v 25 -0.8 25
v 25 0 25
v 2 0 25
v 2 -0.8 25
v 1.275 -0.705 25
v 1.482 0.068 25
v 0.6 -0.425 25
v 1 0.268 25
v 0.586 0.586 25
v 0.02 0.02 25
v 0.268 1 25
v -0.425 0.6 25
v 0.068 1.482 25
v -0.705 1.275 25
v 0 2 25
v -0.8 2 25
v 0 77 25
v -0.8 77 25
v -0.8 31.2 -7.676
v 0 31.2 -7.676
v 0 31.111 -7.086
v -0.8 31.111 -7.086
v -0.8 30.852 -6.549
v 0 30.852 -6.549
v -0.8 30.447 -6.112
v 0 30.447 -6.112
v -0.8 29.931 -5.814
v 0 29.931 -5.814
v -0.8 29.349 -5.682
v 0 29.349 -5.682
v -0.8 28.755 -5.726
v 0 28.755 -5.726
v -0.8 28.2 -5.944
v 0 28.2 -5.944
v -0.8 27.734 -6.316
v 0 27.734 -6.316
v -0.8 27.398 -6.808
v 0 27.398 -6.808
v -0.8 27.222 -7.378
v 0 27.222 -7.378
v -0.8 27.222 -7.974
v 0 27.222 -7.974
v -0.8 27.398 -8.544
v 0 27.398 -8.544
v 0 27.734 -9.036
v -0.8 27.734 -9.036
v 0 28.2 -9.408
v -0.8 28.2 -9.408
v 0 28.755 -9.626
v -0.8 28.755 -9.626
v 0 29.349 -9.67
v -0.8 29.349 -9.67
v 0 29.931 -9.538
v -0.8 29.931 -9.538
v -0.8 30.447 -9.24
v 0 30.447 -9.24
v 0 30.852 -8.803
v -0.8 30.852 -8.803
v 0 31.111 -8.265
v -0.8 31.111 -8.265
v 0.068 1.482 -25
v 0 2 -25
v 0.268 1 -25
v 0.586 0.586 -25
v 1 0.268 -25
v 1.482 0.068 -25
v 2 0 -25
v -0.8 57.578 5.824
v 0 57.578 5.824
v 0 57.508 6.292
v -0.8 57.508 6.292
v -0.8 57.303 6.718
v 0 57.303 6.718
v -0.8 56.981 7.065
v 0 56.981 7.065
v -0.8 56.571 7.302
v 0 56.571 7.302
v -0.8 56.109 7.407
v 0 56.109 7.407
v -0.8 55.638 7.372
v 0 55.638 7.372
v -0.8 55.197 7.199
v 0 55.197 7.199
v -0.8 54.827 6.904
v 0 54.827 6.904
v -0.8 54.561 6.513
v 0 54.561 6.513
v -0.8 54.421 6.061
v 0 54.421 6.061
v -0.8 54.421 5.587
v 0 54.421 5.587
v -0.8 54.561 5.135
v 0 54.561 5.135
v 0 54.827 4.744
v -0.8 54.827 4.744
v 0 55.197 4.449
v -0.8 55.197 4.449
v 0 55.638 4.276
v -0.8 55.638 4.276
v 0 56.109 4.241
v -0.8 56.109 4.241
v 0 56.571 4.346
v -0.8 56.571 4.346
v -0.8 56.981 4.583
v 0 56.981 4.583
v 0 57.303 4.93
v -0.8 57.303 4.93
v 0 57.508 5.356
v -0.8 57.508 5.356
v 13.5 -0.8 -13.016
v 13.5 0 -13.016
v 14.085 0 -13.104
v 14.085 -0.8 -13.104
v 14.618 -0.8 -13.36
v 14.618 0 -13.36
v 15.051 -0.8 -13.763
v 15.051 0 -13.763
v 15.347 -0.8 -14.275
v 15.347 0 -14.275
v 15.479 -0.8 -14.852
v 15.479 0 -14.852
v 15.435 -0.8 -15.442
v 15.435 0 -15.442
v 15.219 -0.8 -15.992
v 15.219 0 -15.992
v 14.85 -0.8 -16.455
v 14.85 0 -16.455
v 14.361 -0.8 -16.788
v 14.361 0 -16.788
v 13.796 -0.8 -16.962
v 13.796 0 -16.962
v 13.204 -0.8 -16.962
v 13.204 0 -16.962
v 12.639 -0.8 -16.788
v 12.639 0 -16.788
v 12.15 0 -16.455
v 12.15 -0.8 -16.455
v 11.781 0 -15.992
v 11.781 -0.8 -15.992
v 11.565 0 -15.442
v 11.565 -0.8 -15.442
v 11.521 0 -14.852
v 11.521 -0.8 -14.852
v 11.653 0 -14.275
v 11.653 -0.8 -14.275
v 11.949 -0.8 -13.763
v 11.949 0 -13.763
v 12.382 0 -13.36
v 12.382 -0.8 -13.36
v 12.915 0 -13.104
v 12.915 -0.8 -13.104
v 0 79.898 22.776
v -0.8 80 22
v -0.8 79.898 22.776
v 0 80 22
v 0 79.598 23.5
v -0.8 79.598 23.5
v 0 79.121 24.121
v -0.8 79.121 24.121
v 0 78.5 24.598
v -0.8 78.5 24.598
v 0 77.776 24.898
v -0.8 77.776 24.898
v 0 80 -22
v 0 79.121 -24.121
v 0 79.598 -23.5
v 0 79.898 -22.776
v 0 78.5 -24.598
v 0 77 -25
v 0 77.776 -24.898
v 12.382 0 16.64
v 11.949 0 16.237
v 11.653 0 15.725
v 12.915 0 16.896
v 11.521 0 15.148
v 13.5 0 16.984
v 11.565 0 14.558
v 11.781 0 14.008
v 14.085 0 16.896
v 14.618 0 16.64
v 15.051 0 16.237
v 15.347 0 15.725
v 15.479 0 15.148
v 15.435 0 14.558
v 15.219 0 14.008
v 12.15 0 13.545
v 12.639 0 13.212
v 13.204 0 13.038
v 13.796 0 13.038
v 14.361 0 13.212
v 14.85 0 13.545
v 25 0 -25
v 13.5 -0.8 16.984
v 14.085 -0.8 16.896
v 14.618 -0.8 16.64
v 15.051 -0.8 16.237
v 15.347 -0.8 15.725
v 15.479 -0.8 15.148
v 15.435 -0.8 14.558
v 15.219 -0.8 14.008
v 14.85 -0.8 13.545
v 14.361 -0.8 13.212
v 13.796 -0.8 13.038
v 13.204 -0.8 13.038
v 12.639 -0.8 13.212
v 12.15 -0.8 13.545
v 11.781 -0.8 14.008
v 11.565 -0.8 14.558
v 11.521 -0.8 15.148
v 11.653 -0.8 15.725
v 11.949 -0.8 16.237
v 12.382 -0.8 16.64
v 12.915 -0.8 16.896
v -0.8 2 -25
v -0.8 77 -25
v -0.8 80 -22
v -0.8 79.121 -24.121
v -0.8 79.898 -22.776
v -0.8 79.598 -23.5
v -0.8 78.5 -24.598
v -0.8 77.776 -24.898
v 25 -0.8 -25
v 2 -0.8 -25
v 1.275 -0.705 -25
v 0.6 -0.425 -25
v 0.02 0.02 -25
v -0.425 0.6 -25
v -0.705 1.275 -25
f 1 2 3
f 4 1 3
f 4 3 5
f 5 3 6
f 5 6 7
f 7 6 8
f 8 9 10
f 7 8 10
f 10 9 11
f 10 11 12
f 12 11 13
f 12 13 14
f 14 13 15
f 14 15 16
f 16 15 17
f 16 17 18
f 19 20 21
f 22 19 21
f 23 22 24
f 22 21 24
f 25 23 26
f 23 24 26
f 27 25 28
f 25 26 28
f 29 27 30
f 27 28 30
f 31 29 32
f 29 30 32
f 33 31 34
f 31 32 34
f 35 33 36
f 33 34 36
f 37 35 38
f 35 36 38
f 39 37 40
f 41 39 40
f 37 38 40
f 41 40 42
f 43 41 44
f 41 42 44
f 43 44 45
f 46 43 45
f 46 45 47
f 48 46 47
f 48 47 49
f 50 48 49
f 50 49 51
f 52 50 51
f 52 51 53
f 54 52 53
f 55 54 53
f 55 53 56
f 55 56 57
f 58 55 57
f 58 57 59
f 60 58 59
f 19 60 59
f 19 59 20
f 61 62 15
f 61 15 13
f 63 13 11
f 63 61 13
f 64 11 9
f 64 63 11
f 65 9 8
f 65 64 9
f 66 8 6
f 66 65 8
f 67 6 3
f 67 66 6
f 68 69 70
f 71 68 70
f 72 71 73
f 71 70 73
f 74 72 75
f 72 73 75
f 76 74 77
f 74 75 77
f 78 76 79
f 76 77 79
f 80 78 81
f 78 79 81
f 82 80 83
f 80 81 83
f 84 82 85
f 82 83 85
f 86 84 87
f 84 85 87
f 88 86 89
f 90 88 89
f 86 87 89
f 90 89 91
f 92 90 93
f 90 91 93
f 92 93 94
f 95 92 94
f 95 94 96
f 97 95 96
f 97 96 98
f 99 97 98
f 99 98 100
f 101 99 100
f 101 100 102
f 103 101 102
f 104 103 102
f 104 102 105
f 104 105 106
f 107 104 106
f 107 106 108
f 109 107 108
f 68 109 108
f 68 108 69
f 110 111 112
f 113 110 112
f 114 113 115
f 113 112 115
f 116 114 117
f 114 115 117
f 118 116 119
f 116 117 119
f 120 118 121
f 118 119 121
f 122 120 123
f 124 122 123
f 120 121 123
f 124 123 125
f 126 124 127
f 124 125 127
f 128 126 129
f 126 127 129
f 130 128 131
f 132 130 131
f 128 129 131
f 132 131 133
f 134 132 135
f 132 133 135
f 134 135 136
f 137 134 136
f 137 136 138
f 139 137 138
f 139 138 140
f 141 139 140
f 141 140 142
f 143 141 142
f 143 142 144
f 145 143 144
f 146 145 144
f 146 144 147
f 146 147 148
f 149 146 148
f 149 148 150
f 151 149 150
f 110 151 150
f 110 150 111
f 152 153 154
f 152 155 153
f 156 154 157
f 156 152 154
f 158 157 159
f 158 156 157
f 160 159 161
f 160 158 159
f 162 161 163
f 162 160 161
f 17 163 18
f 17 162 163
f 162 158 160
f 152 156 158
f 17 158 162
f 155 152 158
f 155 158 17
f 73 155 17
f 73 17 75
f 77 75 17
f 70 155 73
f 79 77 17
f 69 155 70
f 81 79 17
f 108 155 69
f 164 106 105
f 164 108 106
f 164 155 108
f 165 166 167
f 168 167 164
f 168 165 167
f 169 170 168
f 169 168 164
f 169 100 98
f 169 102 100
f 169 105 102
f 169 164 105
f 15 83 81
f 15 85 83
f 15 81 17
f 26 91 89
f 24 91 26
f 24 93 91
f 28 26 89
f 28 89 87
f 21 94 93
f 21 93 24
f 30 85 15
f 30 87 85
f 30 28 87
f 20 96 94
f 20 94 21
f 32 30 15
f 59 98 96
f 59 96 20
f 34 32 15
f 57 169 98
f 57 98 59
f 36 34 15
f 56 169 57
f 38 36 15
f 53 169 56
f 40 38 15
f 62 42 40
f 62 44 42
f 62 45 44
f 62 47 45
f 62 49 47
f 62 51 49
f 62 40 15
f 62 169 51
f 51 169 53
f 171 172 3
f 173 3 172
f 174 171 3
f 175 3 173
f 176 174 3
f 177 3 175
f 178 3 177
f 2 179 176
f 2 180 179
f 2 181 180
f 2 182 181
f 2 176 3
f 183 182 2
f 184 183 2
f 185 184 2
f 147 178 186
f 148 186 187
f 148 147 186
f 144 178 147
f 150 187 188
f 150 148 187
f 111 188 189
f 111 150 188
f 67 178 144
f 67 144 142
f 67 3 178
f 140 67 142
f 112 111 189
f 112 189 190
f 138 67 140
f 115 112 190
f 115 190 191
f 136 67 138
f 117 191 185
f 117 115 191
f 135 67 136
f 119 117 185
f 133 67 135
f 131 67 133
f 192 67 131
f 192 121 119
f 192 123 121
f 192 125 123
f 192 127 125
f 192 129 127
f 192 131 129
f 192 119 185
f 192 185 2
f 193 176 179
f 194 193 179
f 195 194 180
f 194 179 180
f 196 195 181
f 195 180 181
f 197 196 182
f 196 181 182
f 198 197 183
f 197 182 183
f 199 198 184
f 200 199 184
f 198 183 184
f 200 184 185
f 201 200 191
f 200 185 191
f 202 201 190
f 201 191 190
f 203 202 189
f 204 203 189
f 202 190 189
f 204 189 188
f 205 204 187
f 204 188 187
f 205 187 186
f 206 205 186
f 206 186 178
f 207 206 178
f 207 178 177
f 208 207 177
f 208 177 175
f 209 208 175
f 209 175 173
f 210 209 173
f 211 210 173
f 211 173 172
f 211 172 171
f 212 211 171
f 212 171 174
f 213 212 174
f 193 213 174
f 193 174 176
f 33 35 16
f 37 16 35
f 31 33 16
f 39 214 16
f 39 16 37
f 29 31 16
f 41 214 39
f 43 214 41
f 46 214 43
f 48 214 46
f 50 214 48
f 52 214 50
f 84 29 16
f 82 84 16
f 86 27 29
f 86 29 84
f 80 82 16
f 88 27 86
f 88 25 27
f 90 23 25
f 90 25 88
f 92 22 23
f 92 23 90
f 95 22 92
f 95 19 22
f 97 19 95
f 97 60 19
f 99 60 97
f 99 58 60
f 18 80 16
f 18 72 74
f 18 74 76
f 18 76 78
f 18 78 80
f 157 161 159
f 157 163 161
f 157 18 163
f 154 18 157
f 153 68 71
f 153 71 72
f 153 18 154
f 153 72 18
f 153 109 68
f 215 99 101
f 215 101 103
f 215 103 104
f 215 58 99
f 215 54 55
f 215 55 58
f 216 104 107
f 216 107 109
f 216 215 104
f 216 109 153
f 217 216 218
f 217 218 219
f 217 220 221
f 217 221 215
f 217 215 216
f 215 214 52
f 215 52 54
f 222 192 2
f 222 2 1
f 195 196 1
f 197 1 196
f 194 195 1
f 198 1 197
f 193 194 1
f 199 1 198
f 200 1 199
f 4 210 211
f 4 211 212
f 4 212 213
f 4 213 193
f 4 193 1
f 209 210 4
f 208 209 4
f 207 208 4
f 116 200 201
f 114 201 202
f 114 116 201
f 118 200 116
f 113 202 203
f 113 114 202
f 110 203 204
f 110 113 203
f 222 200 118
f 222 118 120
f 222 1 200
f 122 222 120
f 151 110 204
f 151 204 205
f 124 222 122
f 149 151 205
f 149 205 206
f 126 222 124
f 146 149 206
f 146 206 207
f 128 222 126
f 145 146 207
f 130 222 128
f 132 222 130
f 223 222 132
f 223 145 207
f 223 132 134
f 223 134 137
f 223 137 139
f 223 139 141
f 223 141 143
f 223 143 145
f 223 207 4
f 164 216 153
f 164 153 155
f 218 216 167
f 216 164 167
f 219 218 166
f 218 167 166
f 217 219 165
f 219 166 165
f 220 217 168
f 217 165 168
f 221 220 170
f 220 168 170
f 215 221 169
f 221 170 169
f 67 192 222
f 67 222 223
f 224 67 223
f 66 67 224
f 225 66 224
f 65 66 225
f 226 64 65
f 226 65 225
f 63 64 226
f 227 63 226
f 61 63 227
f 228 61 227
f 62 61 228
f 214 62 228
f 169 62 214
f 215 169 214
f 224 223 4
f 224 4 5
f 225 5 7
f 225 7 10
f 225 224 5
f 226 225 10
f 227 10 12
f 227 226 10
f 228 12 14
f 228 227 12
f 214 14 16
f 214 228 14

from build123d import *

# Parameters (mm, degrees)
BASE_FLANGE1_DEPTH      = 25
BASE_FLANGE1_DEPTH_BACK = 25
SKETCH6_R               = 1.5875
SKETCH6_R_2             = 2
CUT_EXTRUDE1_DEPTH      = 88.464278423
SKETCH7_R               = 1.984375
CUT_EXTRUDE2_DEPTH      = 10
FILLET1_R               = 3


# Sheet-metal steps are written as plain solids
with BuildPart() as part:
    # Sketch1 → Base-Flange1 (new, two sides: drawn at the far end of the back side and taken through both)
    with BuildSketch(Plane.XY.offset(-BASE_FLANGE1_DEPTH_BACK)):
        with BuildLine():
            Line((0, 80), (0, 2))
            ThreePointArc((0, 2), (0.585786438, 0.585786438), (2, 0))
            Line((2, 0), (25, 0))
            Line((25, 0), (25, -0.8))
            Line((25, -0.8), (2, -0.8))
            ThreePointArc((2, -0.8), (0.020101013, 0.020101013), (-0.8, 2))
            Line((-0.8, 2), (-0.8, 80))
            Line((-0.8, 80), (0, 80))
        make_face()
    extrude(amount=BASE_FLANGE1_DEPTH + BASE_FLANGE1_DEPTH_BACK)

    # Sketch6 → Cut-Extrude1 (cut, through all)
    with BuildSketch(Plane(origin=(0, 0, 0), x_dir=(0, 0, -1), z_dir=(1, 0, 0))):
        with Locations(Location((-5.824020981, 55.990856649, 0), (0, 0, 90))):
            Circle(SKETCH6_R)
        with Locations(Location((7.675979019, 29.2, 0), (0, 0, 90))):
            Circle(SKETCH6_R_2)
    extrude(amount=-CUT_EXTRUDE1_DEPTH, mode=Mode.SUBTRACT)

    # Sketch7 → Cut-Extrude2 (cut)
    with BuildSketch(Plane(origin=(0, 0, 0), x_dir=(1, 0, 0), z_dir=(0, 1, 0))):
        with Locations(Location((13.5, 15, 0), (0, 0, 270))):
            Circle(SKETCH7_R)
        with Locations(Location((13.5, -15, 0), (0, 0, 270))):
            Circle(SKETCH7_R)
    extrude(amount=-CUT_EXTRUDE2_DEPTH, mode=Mode.SUBTRACT)

    # Fillet1
    fillet1_edges = [part.edges().sort_by_distance(p)[0] for p in [
        (-0.4, 80, 25),
        (-0.4, 80, -25),
    ]]
    fillet(fillet1_edges, radius=FILLET1_R)


solid = part.part
